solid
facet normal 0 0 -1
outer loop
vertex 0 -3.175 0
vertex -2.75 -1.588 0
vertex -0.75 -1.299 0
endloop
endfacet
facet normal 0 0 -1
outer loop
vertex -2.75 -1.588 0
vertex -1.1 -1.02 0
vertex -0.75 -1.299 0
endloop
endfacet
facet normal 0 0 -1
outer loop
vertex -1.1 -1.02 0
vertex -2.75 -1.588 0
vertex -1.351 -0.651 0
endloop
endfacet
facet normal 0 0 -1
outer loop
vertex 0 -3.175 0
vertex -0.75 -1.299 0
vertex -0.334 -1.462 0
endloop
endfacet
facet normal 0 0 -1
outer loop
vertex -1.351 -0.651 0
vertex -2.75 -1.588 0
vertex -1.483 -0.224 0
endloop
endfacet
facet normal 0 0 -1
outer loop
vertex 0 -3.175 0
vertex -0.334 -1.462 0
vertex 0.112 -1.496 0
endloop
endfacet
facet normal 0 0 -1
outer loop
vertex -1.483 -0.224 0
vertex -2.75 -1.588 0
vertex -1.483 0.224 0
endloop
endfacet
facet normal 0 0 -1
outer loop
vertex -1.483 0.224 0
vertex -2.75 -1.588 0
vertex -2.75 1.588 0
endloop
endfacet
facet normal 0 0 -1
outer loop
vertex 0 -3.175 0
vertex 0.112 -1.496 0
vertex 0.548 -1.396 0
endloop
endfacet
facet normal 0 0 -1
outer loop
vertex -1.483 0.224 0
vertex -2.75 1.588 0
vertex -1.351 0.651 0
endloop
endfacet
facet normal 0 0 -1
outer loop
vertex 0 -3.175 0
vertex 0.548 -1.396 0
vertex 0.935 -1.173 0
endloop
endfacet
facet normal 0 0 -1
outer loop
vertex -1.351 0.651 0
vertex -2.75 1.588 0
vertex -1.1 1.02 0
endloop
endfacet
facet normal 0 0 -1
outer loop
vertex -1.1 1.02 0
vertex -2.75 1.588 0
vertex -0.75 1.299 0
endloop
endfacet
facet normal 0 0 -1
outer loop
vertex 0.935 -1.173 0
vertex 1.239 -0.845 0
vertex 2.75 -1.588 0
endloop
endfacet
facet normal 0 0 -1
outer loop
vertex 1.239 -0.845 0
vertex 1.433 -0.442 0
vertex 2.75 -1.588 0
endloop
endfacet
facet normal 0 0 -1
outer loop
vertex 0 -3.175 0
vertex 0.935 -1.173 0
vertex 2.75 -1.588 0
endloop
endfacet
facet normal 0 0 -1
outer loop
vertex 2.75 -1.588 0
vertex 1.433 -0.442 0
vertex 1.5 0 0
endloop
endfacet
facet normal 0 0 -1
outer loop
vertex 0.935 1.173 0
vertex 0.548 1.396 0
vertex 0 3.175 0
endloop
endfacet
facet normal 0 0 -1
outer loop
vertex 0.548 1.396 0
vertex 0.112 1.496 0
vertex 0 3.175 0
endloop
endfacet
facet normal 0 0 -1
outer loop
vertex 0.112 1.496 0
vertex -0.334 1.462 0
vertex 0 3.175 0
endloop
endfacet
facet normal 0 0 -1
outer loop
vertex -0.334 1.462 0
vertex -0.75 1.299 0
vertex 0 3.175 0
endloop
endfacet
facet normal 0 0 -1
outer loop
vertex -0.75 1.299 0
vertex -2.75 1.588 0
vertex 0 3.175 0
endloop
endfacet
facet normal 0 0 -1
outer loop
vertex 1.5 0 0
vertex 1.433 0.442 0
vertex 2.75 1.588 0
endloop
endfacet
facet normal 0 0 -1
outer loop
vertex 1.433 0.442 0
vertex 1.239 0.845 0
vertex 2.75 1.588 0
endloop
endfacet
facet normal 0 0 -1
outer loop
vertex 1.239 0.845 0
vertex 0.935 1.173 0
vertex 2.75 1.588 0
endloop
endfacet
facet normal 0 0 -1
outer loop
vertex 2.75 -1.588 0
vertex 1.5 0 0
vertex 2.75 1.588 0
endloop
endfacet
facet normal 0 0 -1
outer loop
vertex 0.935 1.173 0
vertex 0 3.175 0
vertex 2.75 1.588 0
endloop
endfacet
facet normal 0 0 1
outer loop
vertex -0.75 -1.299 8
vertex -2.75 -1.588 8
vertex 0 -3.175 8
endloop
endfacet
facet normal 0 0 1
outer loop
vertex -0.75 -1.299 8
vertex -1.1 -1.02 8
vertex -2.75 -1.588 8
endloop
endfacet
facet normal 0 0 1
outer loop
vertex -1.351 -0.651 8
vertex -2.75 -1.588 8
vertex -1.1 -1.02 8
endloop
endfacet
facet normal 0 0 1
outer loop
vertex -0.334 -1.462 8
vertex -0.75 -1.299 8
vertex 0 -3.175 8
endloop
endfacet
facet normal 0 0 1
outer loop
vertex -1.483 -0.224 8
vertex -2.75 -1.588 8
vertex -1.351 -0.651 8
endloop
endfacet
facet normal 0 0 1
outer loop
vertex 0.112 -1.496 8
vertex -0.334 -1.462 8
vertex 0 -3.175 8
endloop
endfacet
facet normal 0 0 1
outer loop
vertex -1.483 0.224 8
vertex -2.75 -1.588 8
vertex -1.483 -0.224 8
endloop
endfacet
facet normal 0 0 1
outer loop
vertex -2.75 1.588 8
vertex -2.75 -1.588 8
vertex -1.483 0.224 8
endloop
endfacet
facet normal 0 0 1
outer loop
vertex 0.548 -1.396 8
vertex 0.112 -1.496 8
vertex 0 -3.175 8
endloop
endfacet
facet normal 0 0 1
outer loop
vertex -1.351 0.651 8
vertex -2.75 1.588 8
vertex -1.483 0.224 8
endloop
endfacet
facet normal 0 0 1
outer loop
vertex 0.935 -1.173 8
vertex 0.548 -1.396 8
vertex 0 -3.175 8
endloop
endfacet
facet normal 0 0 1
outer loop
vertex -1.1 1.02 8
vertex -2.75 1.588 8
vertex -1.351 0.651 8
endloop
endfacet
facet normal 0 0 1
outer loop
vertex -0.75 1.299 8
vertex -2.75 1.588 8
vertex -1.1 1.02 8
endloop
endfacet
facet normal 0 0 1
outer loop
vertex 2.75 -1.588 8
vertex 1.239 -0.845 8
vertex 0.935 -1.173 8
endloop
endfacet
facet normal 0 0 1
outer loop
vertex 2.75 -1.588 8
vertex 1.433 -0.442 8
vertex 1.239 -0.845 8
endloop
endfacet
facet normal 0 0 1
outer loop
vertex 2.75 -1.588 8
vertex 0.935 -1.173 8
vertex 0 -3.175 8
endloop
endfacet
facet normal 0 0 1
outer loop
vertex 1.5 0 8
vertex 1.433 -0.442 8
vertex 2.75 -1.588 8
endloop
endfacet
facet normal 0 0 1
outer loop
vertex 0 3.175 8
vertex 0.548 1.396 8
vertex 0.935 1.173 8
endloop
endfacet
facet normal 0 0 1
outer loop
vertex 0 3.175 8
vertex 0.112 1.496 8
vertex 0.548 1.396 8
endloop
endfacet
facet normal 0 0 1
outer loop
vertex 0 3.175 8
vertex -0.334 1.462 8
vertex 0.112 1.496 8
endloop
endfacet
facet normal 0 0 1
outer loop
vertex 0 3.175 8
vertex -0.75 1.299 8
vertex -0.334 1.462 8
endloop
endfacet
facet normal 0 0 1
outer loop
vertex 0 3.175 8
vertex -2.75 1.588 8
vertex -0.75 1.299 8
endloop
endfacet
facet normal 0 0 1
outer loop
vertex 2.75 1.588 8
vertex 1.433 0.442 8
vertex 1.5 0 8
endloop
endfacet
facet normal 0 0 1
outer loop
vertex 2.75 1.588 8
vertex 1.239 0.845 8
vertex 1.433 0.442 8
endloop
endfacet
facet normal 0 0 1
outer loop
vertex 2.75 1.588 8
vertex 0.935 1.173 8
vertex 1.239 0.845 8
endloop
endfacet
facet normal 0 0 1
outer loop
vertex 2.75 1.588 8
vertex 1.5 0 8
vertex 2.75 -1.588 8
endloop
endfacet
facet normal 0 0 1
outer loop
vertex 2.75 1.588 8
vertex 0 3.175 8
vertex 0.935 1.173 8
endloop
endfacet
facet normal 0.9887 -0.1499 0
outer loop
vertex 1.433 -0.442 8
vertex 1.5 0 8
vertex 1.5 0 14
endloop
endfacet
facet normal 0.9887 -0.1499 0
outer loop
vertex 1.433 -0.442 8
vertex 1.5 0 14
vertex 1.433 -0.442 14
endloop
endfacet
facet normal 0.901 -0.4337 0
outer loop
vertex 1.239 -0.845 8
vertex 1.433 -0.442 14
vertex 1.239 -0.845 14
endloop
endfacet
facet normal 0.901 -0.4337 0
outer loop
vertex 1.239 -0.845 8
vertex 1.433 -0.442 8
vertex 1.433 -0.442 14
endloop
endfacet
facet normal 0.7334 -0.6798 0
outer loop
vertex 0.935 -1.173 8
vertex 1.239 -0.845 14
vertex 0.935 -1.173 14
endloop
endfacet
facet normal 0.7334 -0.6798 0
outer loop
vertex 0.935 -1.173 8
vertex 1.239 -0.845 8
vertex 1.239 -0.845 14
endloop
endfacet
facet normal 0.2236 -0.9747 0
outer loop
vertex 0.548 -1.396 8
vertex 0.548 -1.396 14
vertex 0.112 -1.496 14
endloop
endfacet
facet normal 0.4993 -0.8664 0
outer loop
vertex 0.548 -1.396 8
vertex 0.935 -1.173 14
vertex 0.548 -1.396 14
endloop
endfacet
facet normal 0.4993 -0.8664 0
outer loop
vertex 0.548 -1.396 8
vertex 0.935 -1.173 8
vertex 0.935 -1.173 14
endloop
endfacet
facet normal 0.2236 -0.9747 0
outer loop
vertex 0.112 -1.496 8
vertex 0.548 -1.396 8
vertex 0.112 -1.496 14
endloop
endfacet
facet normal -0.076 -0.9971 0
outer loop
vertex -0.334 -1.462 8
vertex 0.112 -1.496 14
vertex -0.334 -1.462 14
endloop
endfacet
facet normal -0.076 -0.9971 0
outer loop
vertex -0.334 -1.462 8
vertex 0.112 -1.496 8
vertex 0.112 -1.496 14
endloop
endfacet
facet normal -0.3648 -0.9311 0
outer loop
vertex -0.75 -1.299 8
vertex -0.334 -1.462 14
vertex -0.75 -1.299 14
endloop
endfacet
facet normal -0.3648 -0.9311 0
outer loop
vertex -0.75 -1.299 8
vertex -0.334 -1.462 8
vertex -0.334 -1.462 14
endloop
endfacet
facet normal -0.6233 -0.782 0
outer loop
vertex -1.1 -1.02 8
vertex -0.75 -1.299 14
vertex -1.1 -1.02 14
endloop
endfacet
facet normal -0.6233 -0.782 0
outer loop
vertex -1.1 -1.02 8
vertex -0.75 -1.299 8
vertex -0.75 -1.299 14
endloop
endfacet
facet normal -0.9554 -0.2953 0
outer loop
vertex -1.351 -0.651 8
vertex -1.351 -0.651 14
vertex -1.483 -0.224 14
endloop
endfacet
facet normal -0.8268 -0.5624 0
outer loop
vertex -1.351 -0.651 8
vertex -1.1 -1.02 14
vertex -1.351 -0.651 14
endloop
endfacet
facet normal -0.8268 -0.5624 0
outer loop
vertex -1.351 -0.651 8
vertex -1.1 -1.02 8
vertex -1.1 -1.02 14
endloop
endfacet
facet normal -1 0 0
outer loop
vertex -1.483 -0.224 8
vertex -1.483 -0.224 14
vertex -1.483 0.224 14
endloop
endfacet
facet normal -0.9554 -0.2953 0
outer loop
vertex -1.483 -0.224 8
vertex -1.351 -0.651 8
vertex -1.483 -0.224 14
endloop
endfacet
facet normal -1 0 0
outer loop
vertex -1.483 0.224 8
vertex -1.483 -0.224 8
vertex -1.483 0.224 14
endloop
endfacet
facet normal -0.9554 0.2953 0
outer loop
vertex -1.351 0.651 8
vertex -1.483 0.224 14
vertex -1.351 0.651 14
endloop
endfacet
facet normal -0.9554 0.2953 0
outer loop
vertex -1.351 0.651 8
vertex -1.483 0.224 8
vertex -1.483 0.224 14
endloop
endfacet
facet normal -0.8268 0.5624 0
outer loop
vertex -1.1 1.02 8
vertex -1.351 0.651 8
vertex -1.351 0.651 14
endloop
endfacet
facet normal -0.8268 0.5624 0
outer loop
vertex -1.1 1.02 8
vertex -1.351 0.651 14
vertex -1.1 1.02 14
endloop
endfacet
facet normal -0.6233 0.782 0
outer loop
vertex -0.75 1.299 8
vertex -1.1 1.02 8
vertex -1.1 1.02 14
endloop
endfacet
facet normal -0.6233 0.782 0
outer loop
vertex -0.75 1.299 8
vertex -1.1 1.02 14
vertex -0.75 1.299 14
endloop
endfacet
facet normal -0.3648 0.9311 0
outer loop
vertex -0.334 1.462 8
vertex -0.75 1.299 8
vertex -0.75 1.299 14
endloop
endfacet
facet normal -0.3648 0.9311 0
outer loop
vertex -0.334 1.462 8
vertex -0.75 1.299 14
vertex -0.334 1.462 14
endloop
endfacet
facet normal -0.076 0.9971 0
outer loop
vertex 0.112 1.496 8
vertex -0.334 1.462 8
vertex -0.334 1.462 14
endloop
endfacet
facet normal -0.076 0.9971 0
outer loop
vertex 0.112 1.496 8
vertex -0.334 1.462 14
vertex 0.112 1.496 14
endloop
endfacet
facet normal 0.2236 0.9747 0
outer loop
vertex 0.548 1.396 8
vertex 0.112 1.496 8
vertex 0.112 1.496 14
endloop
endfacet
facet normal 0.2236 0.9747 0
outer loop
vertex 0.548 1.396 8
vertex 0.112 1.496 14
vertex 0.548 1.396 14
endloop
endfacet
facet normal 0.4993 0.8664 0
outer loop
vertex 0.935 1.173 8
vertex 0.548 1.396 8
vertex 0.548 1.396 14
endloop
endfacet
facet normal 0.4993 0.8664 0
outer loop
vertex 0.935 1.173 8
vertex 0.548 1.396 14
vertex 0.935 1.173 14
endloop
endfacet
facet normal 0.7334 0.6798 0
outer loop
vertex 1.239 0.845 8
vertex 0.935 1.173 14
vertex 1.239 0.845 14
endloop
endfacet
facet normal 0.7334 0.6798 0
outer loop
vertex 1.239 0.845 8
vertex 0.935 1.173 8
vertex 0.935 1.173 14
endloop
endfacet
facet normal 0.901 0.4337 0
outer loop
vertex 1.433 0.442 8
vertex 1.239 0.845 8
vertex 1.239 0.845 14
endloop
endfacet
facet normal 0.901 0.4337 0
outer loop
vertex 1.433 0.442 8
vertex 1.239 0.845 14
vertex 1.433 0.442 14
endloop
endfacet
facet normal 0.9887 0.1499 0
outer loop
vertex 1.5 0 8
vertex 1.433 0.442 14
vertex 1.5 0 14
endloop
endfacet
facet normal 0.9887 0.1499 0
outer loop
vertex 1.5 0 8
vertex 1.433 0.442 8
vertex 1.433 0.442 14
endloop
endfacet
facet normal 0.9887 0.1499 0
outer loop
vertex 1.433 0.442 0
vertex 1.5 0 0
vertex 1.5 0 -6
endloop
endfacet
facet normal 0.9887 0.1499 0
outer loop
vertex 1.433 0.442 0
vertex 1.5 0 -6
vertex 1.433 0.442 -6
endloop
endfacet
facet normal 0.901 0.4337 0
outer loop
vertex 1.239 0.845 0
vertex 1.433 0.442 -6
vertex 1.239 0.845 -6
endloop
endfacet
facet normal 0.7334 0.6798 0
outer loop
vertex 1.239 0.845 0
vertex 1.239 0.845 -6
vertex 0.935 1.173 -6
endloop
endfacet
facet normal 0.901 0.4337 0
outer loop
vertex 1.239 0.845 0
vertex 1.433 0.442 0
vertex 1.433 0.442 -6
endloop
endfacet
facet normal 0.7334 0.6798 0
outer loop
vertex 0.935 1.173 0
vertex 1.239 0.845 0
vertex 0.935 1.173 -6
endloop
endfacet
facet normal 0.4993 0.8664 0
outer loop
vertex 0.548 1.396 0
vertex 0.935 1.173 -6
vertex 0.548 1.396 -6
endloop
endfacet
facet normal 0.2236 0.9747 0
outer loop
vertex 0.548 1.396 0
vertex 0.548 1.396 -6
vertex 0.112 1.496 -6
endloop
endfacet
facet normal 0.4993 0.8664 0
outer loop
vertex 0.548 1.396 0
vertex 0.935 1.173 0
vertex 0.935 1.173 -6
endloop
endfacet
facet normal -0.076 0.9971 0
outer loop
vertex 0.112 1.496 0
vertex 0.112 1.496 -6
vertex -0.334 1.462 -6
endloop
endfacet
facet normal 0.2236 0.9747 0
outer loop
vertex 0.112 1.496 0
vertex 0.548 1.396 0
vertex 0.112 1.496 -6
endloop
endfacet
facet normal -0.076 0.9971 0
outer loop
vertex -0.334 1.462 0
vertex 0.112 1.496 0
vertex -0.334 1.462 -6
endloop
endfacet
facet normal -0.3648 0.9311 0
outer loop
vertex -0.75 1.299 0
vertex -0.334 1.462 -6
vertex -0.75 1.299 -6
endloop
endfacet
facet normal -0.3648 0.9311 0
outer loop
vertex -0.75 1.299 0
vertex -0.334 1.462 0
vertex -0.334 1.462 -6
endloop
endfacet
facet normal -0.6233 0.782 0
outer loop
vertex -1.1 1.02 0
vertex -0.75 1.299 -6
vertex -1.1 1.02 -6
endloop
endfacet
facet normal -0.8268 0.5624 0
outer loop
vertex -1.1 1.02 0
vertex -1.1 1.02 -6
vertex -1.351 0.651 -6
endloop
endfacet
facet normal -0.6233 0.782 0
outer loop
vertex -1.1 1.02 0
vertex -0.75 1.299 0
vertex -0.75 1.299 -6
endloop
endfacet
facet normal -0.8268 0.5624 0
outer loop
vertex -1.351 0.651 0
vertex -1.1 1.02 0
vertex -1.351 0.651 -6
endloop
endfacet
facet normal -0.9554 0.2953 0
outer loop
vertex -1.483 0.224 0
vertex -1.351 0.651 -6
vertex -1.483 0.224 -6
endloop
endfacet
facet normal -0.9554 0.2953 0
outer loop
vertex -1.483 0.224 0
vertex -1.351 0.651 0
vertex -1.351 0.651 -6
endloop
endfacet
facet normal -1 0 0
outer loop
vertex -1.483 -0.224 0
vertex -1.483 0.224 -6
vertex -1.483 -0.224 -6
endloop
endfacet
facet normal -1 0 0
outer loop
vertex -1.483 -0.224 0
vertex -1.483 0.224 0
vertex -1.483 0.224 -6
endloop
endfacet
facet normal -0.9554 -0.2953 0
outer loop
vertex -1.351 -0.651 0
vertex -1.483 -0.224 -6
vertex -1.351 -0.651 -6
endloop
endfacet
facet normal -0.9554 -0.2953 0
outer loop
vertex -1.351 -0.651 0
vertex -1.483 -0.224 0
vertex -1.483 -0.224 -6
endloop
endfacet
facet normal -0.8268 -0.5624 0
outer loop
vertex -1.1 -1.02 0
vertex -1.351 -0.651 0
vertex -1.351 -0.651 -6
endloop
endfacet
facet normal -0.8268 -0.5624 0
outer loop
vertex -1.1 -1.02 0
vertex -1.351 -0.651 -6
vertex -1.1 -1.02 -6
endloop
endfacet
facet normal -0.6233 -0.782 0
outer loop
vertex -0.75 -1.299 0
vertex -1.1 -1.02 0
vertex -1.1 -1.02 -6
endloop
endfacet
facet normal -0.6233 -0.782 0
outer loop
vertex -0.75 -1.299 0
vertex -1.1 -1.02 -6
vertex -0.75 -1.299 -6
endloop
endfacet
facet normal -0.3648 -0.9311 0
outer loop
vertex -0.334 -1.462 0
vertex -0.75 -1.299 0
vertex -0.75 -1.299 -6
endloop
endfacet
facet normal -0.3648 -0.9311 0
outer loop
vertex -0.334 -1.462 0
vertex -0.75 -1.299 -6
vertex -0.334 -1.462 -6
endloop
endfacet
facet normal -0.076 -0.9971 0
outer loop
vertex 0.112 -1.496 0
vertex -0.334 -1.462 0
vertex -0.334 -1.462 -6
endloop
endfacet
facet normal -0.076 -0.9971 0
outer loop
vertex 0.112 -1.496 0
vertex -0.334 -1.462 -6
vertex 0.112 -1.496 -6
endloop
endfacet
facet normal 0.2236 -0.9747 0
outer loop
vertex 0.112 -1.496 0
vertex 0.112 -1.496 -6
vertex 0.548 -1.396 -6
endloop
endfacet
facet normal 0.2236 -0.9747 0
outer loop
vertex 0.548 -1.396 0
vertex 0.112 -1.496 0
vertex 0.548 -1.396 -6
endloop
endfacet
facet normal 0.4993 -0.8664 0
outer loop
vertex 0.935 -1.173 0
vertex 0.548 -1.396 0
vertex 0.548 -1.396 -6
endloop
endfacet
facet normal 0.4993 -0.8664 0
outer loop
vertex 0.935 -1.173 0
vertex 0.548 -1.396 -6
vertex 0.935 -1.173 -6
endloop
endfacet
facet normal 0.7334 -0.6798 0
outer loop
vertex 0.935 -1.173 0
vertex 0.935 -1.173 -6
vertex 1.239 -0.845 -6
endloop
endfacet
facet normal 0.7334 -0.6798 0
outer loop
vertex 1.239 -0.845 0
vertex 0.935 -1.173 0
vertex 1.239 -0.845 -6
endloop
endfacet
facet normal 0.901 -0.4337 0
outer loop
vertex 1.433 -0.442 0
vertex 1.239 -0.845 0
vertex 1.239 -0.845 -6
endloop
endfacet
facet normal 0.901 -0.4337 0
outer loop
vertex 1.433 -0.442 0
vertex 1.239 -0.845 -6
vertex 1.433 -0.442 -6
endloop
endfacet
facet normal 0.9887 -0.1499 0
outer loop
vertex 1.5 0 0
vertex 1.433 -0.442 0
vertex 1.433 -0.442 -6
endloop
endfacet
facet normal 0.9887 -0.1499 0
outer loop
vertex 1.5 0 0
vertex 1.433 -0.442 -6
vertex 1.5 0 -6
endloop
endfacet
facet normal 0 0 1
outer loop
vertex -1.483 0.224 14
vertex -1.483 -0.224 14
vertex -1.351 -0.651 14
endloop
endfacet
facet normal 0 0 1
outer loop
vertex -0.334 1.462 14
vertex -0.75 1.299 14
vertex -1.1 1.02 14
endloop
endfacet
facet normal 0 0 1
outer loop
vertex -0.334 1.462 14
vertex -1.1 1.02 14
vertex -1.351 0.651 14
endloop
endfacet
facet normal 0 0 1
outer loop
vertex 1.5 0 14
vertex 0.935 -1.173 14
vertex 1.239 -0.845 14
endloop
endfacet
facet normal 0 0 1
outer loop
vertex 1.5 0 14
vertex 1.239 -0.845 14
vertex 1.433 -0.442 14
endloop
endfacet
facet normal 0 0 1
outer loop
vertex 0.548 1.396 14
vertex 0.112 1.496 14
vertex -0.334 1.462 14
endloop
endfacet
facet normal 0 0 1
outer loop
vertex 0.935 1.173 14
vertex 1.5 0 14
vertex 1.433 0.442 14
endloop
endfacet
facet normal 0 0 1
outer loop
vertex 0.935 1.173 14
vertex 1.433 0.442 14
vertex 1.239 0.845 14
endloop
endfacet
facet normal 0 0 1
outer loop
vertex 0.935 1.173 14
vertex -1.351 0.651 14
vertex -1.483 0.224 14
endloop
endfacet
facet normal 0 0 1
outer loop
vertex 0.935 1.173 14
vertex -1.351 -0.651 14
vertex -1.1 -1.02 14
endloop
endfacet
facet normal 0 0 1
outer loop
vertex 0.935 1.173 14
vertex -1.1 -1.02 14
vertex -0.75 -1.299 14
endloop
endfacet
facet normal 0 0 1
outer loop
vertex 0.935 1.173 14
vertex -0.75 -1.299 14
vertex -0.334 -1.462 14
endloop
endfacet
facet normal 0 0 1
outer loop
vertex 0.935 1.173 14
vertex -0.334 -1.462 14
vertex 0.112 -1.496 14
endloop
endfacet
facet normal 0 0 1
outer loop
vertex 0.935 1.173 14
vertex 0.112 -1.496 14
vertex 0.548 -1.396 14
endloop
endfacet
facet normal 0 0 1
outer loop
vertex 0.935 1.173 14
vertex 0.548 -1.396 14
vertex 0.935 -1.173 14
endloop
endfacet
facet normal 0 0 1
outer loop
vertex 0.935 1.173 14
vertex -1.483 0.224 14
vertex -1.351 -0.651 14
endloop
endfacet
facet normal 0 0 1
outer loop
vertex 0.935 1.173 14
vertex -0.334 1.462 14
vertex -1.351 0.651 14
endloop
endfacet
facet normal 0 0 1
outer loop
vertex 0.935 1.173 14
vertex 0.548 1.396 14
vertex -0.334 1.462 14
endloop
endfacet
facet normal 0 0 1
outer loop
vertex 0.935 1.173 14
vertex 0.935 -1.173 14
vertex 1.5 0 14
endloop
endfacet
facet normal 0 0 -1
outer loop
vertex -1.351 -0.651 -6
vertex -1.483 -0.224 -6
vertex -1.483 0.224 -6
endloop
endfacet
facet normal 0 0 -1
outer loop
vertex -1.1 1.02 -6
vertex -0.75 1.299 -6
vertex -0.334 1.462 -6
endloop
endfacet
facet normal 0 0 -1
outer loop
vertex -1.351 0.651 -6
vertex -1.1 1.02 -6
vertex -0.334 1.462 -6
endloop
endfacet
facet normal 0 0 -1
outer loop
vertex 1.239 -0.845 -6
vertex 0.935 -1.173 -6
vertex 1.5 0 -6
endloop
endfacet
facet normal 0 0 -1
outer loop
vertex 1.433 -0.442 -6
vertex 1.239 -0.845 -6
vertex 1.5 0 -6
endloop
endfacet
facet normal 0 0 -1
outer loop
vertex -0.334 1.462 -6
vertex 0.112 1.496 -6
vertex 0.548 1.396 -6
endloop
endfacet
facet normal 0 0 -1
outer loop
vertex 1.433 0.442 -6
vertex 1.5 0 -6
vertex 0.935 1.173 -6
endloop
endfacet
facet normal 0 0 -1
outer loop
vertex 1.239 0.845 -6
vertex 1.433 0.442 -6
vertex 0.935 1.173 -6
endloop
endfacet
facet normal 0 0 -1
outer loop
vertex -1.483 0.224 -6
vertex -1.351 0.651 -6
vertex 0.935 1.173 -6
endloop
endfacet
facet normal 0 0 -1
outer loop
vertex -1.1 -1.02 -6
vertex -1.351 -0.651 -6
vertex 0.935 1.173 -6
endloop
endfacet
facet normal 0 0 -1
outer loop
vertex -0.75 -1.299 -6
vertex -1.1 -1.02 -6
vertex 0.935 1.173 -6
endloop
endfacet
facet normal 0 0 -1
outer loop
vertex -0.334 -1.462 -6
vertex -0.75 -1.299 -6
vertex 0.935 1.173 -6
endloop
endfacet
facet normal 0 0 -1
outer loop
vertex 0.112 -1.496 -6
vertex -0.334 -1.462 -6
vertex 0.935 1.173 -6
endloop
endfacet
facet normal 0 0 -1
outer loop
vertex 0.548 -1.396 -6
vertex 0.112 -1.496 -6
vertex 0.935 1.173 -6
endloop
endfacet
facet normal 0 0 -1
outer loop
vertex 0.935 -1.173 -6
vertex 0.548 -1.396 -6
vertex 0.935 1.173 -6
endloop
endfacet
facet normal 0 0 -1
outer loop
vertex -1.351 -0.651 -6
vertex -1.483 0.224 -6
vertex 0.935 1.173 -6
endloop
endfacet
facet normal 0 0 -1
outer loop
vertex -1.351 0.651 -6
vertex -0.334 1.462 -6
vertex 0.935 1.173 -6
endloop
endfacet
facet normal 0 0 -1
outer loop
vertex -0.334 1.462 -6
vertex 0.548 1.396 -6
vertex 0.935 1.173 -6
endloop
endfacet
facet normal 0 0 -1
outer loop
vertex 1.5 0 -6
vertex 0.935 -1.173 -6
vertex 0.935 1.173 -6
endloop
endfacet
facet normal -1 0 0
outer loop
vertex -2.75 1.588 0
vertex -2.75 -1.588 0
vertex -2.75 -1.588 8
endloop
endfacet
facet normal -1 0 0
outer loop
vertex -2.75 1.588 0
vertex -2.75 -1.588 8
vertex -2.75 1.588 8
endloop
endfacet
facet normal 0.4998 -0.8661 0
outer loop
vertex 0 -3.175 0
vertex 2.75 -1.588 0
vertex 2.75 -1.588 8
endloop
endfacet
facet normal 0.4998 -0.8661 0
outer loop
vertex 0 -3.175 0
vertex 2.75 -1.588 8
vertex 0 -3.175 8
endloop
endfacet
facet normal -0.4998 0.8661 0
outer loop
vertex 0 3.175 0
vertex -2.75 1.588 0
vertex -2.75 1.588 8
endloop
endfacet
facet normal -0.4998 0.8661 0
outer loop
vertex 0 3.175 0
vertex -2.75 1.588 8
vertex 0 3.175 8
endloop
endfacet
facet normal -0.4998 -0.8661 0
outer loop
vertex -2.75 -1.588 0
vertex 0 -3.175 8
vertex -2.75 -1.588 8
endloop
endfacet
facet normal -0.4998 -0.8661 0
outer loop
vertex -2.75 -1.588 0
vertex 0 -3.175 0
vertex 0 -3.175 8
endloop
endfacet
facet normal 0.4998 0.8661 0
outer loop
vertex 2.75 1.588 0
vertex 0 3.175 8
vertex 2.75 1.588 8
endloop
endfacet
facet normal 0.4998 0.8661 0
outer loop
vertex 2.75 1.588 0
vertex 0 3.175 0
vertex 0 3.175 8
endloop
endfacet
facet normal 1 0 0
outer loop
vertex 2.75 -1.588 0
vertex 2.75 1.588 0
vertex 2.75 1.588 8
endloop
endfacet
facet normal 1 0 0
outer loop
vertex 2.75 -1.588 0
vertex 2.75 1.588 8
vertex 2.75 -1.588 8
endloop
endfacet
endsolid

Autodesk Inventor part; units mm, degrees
ref_plane "YZ Plane" through (0, 0, 0) normal (1, 0, 0) x (0, 1, 0)
ref_plane "XZ Plane" through (0, 0, 0) normal (0, 1, 0) x (-1, 0, 0)
ref_plane "XY Plane" through (0, 0, 0) normal (0, 0, 1) x (1, 0, 0)
sketch "スケッチ1" plane through (0, 0, 0) normal (0, 0, 1) x (1, 0, 0)
  line L0 (-2.75, 1.5877) -> (0, 3.1754)
  line L1 (0, 3.1754) -> (2.75, 1.5877)
  line L2 (2.75, 1.5877) -> (2.75, -1.5877)
  line L3 (2.75, -1.5877) -> (0, -3.1754)
  line L4 (0, -3.1754) -> (-2.75, -1.5877)
  line L5 (-2.75, -1.5877) -> (-2.75, 1.5877)
  circle A0 centre (0, 0) radius 1.5
  dimension "d0" = 5.5
  dimension "d1" = 3
extrude "押し出し1" add sketch "スケッチ1" along normal blind 8 contours L0 L1 L2 L3 L4 L5 | A0
sketch "スケッチ2" plane through (0, 0, 8) normal (0, 0, 1) x (1, 0, 0)
  circle A0 centre (0, 0) radius 1.5
  dimension "d4" = 3
extrude "押し出し2" add sketch "スケッチ2" along normal blind 6
extrude "押し出し3" add sketch "スケッチ1" against normal blind 6 contours A0
properties part number "スペーサー　両雄ねじ　m3-8" material "アルミニウム 2014-T4"
